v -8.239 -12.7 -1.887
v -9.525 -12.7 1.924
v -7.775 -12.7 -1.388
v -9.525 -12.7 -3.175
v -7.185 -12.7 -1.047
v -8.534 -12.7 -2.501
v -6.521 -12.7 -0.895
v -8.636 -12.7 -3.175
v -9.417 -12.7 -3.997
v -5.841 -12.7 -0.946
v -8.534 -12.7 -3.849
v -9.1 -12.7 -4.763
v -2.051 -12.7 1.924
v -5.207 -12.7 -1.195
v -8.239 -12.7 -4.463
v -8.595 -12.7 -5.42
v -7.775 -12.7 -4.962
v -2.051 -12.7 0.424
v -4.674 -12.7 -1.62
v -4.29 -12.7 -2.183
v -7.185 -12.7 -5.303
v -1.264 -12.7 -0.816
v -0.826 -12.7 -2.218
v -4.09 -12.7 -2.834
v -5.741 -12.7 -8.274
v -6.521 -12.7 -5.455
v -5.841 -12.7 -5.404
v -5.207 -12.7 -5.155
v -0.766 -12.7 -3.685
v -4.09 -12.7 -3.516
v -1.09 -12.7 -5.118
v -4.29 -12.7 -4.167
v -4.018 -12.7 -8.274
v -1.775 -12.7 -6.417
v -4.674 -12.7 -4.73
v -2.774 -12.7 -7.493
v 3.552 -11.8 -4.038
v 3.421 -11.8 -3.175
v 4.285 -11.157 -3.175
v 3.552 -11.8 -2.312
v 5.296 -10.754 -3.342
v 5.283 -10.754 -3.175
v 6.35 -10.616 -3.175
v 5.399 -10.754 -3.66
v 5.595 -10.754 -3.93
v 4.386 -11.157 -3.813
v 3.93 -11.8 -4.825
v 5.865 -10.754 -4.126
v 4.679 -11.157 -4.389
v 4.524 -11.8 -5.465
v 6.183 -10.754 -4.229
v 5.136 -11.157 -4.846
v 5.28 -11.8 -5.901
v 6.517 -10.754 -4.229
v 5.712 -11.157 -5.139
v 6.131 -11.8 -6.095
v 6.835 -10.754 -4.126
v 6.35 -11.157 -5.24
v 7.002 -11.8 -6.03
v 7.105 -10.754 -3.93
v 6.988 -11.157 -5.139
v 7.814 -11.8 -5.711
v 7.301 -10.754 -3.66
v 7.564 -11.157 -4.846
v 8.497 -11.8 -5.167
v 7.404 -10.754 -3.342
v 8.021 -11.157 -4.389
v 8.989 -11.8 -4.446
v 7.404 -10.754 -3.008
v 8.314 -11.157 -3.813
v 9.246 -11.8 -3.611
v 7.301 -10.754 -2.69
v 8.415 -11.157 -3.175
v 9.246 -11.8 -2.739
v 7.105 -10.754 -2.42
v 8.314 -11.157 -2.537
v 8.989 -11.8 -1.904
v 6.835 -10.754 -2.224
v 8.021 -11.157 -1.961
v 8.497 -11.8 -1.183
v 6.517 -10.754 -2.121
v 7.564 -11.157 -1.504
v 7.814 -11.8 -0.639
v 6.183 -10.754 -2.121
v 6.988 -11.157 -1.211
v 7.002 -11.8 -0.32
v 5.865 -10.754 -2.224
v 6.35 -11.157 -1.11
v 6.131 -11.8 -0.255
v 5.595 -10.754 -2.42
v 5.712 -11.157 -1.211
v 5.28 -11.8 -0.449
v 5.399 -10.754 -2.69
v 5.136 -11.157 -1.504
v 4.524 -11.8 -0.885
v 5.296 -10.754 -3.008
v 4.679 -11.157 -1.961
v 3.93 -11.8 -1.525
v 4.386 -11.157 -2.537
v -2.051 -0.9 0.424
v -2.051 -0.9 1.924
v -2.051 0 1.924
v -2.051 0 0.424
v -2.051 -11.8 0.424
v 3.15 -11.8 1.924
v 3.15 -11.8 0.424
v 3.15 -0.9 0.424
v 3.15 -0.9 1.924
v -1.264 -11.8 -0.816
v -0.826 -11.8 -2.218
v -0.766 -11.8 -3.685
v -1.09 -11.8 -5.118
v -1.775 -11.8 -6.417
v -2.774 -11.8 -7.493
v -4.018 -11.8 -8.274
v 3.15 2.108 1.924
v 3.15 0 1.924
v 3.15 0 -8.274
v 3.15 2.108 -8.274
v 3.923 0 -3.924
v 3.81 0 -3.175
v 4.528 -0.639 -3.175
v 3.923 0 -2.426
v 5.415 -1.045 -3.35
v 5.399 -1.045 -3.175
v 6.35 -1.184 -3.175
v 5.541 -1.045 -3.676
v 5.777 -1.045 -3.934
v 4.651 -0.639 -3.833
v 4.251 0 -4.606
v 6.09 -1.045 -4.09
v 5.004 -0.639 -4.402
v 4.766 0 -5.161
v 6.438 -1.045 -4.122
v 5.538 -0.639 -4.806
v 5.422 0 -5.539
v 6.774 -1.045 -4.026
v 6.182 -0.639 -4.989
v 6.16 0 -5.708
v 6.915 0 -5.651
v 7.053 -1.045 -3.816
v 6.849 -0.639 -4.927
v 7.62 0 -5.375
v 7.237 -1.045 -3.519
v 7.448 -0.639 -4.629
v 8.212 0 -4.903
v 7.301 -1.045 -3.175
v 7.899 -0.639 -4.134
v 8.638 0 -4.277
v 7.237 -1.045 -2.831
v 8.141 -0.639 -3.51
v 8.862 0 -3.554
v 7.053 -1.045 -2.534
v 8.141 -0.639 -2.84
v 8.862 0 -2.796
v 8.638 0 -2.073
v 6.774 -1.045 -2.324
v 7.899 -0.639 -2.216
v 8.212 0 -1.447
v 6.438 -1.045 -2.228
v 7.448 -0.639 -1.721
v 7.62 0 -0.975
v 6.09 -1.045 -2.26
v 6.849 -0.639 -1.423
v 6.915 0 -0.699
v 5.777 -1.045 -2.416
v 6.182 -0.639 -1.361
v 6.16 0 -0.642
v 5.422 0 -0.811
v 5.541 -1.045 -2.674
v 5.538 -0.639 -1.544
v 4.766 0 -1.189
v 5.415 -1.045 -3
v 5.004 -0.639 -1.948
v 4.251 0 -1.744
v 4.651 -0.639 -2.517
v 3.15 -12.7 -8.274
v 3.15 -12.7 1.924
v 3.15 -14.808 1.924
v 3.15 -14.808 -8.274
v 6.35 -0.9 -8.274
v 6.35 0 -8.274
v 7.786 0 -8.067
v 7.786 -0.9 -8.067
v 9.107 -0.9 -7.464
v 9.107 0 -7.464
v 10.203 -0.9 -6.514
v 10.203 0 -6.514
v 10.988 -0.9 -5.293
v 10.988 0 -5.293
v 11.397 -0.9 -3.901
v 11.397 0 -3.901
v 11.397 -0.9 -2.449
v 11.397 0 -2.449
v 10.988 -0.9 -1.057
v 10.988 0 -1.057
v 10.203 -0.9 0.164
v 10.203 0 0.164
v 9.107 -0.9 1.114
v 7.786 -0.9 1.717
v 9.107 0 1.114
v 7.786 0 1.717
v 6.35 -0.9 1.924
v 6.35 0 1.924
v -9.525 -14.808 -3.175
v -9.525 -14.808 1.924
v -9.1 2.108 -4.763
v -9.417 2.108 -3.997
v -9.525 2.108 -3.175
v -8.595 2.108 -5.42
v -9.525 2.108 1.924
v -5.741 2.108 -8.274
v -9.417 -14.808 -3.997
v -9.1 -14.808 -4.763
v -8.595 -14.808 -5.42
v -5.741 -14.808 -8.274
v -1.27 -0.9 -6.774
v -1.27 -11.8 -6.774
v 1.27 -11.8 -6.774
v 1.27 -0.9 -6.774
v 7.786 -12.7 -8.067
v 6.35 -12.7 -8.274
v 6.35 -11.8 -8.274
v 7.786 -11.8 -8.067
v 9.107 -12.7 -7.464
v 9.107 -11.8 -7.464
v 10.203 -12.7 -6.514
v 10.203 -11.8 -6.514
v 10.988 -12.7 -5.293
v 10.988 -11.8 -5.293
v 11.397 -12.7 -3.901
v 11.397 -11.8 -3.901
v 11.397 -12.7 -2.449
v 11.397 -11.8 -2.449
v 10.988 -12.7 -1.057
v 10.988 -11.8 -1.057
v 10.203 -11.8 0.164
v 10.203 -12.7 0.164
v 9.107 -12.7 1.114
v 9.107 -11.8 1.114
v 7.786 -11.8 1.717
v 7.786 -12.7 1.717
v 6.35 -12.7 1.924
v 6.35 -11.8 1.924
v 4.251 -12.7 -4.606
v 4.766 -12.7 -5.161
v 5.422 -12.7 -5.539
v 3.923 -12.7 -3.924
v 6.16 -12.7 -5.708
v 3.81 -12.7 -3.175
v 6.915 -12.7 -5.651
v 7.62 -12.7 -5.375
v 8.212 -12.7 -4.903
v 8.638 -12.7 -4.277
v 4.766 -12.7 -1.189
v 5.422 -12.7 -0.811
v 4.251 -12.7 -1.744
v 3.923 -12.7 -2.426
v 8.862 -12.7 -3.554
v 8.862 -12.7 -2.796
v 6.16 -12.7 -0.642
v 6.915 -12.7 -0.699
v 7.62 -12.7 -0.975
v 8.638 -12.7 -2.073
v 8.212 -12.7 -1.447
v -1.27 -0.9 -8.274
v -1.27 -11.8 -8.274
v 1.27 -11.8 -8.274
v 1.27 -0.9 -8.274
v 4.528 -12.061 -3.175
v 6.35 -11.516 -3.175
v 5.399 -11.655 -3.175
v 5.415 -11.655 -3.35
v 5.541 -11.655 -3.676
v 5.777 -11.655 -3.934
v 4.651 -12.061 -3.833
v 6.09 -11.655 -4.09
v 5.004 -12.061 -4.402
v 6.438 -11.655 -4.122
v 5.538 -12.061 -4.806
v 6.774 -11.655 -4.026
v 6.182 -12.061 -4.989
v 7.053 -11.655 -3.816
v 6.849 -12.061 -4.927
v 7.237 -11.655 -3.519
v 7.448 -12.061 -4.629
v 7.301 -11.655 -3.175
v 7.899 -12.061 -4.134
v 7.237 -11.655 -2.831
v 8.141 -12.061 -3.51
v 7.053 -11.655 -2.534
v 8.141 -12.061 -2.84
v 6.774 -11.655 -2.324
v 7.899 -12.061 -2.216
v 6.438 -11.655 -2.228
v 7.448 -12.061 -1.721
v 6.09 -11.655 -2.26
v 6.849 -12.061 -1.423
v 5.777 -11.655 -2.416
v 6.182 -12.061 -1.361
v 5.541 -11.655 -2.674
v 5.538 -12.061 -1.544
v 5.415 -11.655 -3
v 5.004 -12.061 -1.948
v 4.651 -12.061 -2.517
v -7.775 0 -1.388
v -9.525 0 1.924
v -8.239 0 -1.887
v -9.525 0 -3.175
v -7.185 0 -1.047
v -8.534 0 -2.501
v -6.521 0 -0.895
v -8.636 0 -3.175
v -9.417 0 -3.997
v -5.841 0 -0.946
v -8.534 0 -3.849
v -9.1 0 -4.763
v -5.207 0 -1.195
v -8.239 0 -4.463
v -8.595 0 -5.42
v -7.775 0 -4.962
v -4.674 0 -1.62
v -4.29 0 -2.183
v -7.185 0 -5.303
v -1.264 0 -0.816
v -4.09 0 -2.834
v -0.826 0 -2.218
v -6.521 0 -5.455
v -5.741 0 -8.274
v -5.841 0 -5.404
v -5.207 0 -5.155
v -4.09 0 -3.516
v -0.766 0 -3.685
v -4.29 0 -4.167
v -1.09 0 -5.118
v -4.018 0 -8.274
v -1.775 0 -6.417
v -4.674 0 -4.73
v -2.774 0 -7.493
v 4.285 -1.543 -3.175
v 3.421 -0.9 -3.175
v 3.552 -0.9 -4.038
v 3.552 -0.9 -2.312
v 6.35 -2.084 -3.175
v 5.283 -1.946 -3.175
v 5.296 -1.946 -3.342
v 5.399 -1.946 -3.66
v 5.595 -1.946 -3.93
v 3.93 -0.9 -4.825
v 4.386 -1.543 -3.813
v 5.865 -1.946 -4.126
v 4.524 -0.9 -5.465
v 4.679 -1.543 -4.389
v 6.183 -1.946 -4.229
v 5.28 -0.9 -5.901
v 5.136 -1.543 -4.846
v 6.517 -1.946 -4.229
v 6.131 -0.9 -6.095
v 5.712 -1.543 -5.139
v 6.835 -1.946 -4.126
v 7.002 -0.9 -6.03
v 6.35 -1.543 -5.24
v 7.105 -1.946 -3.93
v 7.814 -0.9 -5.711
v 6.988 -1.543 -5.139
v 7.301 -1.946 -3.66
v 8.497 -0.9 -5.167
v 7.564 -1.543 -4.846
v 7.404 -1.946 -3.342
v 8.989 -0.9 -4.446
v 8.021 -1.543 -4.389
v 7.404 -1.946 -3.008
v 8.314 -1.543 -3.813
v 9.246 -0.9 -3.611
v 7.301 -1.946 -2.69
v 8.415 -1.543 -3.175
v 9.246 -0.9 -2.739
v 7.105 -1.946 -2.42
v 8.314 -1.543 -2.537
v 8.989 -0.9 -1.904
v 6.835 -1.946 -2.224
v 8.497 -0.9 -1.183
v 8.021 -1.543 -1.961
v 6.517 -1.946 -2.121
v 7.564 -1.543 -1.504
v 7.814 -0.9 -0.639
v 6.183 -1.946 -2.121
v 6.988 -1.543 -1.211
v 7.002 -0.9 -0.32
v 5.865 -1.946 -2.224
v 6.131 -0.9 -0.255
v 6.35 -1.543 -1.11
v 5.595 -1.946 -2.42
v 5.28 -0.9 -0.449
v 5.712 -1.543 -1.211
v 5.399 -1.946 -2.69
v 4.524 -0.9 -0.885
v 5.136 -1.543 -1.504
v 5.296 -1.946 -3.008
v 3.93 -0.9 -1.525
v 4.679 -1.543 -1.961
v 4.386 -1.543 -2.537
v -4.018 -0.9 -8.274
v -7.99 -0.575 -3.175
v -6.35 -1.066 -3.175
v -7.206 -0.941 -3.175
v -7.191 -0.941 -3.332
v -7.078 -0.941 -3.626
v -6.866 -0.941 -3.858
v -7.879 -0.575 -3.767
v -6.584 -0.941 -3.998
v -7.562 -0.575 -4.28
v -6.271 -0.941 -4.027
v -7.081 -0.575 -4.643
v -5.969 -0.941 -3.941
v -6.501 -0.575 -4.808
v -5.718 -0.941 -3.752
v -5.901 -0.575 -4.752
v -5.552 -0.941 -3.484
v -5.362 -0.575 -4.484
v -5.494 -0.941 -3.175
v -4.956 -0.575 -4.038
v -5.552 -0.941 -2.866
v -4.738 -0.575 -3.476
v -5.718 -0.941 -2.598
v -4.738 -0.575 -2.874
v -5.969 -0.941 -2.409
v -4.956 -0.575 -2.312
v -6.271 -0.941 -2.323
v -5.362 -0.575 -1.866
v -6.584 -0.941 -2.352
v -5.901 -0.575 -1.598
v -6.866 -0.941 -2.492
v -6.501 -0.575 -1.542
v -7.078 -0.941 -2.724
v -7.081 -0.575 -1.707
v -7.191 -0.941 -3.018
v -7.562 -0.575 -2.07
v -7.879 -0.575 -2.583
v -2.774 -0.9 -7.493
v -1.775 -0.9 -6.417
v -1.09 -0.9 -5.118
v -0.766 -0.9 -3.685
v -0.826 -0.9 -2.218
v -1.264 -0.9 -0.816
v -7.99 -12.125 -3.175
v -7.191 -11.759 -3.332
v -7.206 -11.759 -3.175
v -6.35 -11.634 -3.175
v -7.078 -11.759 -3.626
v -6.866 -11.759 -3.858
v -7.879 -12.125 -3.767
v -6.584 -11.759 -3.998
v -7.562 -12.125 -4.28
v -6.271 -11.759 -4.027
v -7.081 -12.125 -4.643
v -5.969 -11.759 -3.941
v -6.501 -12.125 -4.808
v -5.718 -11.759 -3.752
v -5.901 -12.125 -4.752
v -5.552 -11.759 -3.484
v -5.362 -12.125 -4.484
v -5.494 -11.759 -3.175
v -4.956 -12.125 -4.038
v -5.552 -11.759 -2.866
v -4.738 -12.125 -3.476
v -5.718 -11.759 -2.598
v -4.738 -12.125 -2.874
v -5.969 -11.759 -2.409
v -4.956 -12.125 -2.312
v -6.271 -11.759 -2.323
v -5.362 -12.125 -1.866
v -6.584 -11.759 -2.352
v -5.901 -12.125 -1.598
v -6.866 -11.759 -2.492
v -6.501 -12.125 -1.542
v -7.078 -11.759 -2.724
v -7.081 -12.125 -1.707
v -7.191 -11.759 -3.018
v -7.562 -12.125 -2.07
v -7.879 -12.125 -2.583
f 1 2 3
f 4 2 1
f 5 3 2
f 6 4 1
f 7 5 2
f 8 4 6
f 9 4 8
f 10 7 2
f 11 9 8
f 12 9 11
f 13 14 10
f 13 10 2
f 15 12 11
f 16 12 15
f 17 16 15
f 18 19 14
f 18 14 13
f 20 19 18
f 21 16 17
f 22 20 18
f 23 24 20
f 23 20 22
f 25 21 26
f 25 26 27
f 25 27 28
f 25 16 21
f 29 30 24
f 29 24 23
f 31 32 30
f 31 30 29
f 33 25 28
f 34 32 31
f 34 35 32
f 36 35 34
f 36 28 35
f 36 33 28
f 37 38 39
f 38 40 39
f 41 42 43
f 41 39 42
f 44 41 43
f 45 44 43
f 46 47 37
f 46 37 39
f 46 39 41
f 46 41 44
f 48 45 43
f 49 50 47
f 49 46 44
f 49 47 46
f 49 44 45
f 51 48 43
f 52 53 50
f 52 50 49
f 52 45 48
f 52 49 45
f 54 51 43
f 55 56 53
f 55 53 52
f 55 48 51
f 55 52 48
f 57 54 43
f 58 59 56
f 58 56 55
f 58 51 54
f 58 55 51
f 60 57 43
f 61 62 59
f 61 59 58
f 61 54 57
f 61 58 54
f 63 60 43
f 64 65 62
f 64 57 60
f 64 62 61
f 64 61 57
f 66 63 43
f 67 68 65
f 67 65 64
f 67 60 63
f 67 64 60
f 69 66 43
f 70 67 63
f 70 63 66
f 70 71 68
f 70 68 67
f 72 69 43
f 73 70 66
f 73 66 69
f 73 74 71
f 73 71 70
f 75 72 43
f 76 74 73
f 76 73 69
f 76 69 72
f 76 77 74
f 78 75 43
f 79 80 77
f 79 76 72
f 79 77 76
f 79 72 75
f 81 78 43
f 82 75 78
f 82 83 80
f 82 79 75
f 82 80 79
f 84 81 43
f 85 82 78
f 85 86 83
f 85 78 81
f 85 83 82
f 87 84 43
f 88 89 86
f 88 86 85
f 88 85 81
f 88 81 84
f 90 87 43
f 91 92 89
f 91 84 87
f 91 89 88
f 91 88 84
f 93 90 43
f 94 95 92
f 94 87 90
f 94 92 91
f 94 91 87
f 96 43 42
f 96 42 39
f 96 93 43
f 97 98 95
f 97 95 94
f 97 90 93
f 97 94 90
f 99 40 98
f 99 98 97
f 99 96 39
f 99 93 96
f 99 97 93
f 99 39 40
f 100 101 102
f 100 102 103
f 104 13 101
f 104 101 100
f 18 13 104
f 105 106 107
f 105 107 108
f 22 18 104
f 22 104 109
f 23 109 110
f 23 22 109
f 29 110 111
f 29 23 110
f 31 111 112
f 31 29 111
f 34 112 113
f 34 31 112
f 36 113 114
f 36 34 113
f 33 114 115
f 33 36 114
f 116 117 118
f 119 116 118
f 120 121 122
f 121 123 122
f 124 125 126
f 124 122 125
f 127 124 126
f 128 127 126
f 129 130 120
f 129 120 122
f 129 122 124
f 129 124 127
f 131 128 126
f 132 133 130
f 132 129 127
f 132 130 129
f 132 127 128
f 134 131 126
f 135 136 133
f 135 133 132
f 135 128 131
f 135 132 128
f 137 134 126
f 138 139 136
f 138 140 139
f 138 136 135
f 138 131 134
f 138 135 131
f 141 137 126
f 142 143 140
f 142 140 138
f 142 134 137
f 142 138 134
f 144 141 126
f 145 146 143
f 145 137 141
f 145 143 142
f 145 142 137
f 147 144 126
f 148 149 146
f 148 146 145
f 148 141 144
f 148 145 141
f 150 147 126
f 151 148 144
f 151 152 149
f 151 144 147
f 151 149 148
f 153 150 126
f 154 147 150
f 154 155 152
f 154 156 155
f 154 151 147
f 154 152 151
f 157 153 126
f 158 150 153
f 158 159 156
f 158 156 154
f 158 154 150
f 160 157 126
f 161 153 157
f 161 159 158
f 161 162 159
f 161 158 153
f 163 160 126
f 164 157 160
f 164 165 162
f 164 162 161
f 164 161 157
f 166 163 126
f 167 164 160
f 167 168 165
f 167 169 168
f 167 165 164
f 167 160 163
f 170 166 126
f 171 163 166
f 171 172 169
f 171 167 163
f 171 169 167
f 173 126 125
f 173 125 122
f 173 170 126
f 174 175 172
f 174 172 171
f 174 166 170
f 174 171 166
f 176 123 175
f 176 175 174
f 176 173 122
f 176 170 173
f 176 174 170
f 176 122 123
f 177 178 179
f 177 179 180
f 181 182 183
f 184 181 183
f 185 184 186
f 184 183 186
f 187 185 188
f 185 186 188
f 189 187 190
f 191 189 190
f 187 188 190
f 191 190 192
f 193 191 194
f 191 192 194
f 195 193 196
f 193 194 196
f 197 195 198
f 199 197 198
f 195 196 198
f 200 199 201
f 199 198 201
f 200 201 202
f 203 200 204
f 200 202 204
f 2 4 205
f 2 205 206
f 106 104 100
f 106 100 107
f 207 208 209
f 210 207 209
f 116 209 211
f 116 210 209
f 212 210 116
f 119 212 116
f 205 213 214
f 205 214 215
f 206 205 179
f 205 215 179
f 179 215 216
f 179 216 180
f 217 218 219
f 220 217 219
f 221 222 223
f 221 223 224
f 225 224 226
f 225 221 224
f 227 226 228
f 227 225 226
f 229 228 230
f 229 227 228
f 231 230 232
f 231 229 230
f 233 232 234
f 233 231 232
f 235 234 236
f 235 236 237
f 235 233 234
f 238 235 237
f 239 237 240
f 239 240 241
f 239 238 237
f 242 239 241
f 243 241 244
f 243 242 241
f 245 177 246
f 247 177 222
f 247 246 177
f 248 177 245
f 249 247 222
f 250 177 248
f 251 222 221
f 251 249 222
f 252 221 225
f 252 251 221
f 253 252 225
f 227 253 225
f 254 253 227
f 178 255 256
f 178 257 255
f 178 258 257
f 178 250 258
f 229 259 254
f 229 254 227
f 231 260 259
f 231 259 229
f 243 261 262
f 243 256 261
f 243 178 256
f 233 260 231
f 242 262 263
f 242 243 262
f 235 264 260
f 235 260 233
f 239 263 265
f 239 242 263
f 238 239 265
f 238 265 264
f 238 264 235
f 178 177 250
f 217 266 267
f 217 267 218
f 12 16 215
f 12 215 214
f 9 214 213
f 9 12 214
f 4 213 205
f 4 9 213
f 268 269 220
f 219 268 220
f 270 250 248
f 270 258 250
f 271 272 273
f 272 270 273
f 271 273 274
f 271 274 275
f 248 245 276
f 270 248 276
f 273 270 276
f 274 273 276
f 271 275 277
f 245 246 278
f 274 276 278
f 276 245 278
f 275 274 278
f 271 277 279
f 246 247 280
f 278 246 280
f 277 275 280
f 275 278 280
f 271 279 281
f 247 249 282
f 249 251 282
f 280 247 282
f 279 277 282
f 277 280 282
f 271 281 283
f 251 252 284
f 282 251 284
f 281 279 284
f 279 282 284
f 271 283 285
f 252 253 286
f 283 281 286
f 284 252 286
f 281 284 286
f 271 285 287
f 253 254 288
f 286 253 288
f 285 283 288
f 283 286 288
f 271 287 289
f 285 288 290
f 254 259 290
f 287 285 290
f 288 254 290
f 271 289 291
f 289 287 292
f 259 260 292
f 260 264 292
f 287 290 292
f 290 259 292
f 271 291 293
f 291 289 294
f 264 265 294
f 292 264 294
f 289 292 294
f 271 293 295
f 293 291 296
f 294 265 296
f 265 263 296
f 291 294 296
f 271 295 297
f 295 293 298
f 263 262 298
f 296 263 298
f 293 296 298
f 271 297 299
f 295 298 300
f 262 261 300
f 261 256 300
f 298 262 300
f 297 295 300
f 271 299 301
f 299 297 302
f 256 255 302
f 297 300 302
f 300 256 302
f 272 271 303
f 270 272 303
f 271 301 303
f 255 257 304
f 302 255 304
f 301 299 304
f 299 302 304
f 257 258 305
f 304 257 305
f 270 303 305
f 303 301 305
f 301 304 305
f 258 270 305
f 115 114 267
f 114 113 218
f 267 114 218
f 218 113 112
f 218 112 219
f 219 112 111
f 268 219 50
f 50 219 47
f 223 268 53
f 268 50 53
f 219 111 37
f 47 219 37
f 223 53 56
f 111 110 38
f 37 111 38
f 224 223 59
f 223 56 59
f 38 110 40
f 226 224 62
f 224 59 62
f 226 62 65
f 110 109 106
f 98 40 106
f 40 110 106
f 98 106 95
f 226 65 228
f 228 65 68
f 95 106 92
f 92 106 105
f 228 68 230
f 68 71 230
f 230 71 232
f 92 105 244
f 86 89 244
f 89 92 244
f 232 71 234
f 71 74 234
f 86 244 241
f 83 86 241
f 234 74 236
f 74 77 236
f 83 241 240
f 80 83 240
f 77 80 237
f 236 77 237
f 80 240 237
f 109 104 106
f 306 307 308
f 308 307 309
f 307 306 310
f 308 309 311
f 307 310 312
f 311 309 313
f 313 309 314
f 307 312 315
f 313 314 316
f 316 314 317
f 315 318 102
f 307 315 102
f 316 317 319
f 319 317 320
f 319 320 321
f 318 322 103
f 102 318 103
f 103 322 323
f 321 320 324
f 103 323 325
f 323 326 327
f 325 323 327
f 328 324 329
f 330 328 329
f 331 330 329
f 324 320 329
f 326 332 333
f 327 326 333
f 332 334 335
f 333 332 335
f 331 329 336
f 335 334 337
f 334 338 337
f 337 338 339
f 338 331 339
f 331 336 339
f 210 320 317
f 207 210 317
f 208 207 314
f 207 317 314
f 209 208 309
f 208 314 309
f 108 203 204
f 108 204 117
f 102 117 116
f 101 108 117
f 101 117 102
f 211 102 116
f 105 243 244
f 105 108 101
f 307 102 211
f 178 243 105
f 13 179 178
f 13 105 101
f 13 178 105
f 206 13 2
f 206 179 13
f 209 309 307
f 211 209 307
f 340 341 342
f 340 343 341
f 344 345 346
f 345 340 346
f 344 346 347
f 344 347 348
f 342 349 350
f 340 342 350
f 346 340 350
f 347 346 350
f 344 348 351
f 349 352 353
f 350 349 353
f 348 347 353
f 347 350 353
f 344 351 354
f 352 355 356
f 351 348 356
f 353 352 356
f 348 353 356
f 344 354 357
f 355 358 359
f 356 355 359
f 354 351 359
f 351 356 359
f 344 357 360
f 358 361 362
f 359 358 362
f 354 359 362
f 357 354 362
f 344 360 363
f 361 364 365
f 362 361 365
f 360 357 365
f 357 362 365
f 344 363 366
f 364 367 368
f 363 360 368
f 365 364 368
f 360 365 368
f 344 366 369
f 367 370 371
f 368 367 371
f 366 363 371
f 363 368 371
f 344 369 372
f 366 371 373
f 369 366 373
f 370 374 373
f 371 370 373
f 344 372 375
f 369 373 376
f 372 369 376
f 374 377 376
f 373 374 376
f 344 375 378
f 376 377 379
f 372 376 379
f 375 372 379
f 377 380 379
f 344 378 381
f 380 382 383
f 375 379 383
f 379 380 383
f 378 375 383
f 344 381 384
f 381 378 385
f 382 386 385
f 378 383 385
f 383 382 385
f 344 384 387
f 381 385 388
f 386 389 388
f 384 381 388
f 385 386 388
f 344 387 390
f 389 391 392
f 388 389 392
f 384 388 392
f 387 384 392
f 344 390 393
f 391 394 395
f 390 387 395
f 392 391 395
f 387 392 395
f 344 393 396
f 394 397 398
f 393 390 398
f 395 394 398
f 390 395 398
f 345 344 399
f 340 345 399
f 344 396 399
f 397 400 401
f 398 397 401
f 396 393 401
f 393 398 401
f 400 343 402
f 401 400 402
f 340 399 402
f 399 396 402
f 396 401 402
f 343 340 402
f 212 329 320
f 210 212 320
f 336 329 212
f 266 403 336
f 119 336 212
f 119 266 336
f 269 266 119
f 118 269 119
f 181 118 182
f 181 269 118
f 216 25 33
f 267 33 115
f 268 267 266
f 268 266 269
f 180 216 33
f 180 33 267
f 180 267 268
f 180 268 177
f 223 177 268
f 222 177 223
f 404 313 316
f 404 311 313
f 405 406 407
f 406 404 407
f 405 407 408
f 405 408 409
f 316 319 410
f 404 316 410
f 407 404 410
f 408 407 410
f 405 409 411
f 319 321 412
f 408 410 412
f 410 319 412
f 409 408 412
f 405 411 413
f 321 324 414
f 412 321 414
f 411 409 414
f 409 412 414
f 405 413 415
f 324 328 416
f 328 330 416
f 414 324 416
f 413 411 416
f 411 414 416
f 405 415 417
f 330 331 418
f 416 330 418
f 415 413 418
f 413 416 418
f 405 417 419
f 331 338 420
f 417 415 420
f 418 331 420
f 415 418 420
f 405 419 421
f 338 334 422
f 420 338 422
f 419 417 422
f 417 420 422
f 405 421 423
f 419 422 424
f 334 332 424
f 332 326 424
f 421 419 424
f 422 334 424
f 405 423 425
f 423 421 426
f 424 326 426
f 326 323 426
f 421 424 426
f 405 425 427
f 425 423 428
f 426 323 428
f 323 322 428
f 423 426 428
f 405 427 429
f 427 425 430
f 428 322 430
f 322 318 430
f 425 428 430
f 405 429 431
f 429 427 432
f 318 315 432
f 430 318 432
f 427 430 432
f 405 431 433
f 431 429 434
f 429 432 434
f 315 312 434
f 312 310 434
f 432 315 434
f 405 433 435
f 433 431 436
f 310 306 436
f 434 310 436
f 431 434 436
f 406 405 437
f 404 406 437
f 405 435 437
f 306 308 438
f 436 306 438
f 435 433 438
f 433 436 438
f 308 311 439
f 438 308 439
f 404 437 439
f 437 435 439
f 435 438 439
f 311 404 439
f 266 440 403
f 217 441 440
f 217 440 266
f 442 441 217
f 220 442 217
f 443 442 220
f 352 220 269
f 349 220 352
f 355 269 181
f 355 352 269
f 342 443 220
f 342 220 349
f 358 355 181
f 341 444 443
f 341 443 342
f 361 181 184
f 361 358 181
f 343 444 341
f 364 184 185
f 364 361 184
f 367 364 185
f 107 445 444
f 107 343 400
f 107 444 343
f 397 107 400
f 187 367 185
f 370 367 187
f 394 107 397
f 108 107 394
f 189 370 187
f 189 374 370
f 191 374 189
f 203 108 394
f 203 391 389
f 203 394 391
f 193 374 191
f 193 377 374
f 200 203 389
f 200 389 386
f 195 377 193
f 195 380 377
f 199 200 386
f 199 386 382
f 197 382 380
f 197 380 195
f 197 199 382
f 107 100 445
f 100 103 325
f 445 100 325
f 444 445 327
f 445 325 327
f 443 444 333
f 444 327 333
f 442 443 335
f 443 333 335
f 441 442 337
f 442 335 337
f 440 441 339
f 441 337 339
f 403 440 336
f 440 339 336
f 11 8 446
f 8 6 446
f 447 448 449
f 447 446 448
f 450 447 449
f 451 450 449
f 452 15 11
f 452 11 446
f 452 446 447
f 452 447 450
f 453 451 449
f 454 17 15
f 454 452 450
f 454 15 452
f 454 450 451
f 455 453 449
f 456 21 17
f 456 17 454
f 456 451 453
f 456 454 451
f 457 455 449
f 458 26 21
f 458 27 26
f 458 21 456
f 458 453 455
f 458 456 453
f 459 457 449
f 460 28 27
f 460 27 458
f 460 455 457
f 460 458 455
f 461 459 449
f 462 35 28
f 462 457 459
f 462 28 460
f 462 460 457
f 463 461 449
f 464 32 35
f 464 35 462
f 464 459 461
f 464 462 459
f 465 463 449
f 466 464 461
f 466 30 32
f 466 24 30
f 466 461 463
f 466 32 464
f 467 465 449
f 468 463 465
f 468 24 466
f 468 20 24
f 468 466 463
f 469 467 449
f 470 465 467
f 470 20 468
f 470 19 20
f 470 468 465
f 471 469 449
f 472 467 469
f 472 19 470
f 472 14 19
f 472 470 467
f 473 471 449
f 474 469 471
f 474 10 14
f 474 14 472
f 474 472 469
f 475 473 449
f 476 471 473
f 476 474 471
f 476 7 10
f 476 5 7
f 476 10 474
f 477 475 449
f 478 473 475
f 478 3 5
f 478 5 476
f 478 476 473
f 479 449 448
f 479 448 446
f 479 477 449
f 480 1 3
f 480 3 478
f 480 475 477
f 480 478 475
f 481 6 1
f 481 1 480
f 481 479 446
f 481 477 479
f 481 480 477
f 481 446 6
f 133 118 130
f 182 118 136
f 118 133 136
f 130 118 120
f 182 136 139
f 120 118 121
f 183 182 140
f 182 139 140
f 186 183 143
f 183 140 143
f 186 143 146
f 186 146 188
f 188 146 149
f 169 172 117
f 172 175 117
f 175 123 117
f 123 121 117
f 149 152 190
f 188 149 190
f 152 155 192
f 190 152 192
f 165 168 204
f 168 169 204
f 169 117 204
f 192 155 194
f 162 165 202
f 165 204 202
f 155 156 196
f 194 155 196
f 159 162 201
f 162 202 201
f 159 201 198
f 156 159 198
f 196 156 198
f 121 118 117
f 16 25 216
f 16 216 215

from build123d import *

# Parameters (mm, degrees)
BOSS_EXTRUDE2_DEPTH = 2.1082
BOSS_EXTRUDE3_DEPTH = 0.9
SKETCH13_W          = 5.200208993
SKETCH13_H          = 1.5
BOSS_EXTRUDE4_DEPTH = 6.35
SKETCH16_W          = 2.54
SKETCH16_H          = 1.5
BOSS_EXTRUDE5_DEPTH = 5.45


with BuildPart() as part:
    # Sketch6 → Boss-Extrude2 (new body)
    with BuildSketch(Plane(origin=(0, 0, 0), x_dir=(1, 0, 0), z_dir=(0, 1, 0))):
        with BuildLine():
            Line((3.1496, 3.175), (3.1496, 8.27377964))
            Line((3.1496, 8.27377964), (-5.741348421, 8.27377964))
            Line((-5.741348421, 8.27377964), (-8.59506403, 5.42006403))
            ThreePointArc((-8.59506403, 5.42006403), (-9.283317516, 4.390019898), (-9.525, 3.175))
            Line((-9.525, 3.175), (-9.525, -1.92377964))
            Line((-9.525, -1.92377964), (-6.989909723, -1.92377964))
            Line((-6.989909723, -1.92377964), (3.1496, -1.92377964))
            Line((3.1496, -1.92377964), (3.1496, 3.175))
        make_face()
    extrude(amount=BOSS_EXTRUDE2_DEPTH)

    # Sketch7 → Boss-Extrude3 (add)
    with BuildSketch(Plane.XZ):
        with BuildLine():
            Line((-2.050608993, 1.92377964), (-2.050608993, 0.42377964))
            ThreePointArc((-2.050608993, 0.42377964), (-0.881374643, -4.411978027), (-4.017957094, -8.27377964))
            Line((-4.017957094, -8.27377964), (6.35, -8.27377964))
            ThreePointArc((6.35, -8.27377964), (11.44877964, -3.175), (6.35, 1.92377964))
            Line((6.35, 1.92377964), (-2.050608993, 1.92377964))
        make_face()
    extrude(amount=BOSS_EXTRUDE3_DEPTH)

    # Sketch10 → Revolve2 (revolve)
    with BuildSketch(Plane.XY.offset(-3.175), mode=Mode.PRIVATE) as revolve2_sk:
        with BuildLine():
            Line((-6.35, 0), (-6.35, -1.065979307))
            ThreePointArc((-6.35, -1.065979307), (-5.088839039, -0.786386653), (-4.064, 0))
            Line((-4.064, 0), (-6.35, 0))
        make_face()
    revolve(revolve2_sk.sketch.rotate(Axis((-6.35, 0, -3.175), (0, -1, 0)), 180), axis=Axis((-6.35, 0, -3.175), (0, -1, 0)))

    # Sketch11 → Revolve4 (revolve)
    with BuildSketch(Plane.XY.offset(-3.175), mode=Mode.PRIVATE) as revolve4_sk:
        with BuildLine():
            Line((6.35, -0.9), (6.35, -2.083581452))
            ThreePointArc((6.35, -2.083581452), (7.929346537, -1.776499661), (9.278562256, -0.9))
            Line((9.278562256, -0.9), (6.35, -0.9))
        make_face()
    revolve(revolve4_sk.sketch.rotate(Axis((6.35, -0.9, -3.175), (0, -1, 0)), 180), axis=Axis((6.35, -0.9, -3.175), (0, -1, 0)))

    # Sketch12 → Cut-Revolve1 (revolve, cut)
    with BuildSketch(Plane.XY.offset(-3.175), mode=Mode.PRIVATE) as cut_revolve1_sk:
        with BuildLine():
            Line((8.89, 0), (6.35, 0))
            Line((6.35, 0), (6.35, -1.184421452))
            ThreePointArc((6.35, -1.184421452), (7.751289957, -0.873762947), (8.89, 0))
        make_face()
    revolve(cut_revolve1_sk.sketch.rotate(Axis((6.35, 0, -3.175), (0, -1, 0)), 180), axis=Axis((6.35, 0, -3.175), (0, -1, 0)), mode=Mode.SUBTRACT)

    # Sketch13 → Boss-Extrude4 (add)
    with BuildSketch(Plane.XZ):
        with Locations((0.549495504, 1.17377964)):
            Rectangle(SKETCH13_W, SKETCH13_H)
    extrude(amount=BOSS_EXTRUDE4_DEPTH)

    # Sketch16 → Boss-Extrude5 (add)
    with BuildSketch(Plane.XZ.offset(0.9)):
        with Locations((0, -7.52377964)):
            Rectangle(SKETCH16_W, SKETCH16_H)
    extrude(amount=BOSS_EXTRUDE5_DEPTH)

    # Mirror1: part across plane


with BuildPart() as part_1:
    add(part.part)
    add(part.part.mirror(Plane(origin=(3.1496, -6.35, 1.92377964), x_dir=(0, 0, 1), z_dir=(0, 1, 0))))


solid = part_1.part
